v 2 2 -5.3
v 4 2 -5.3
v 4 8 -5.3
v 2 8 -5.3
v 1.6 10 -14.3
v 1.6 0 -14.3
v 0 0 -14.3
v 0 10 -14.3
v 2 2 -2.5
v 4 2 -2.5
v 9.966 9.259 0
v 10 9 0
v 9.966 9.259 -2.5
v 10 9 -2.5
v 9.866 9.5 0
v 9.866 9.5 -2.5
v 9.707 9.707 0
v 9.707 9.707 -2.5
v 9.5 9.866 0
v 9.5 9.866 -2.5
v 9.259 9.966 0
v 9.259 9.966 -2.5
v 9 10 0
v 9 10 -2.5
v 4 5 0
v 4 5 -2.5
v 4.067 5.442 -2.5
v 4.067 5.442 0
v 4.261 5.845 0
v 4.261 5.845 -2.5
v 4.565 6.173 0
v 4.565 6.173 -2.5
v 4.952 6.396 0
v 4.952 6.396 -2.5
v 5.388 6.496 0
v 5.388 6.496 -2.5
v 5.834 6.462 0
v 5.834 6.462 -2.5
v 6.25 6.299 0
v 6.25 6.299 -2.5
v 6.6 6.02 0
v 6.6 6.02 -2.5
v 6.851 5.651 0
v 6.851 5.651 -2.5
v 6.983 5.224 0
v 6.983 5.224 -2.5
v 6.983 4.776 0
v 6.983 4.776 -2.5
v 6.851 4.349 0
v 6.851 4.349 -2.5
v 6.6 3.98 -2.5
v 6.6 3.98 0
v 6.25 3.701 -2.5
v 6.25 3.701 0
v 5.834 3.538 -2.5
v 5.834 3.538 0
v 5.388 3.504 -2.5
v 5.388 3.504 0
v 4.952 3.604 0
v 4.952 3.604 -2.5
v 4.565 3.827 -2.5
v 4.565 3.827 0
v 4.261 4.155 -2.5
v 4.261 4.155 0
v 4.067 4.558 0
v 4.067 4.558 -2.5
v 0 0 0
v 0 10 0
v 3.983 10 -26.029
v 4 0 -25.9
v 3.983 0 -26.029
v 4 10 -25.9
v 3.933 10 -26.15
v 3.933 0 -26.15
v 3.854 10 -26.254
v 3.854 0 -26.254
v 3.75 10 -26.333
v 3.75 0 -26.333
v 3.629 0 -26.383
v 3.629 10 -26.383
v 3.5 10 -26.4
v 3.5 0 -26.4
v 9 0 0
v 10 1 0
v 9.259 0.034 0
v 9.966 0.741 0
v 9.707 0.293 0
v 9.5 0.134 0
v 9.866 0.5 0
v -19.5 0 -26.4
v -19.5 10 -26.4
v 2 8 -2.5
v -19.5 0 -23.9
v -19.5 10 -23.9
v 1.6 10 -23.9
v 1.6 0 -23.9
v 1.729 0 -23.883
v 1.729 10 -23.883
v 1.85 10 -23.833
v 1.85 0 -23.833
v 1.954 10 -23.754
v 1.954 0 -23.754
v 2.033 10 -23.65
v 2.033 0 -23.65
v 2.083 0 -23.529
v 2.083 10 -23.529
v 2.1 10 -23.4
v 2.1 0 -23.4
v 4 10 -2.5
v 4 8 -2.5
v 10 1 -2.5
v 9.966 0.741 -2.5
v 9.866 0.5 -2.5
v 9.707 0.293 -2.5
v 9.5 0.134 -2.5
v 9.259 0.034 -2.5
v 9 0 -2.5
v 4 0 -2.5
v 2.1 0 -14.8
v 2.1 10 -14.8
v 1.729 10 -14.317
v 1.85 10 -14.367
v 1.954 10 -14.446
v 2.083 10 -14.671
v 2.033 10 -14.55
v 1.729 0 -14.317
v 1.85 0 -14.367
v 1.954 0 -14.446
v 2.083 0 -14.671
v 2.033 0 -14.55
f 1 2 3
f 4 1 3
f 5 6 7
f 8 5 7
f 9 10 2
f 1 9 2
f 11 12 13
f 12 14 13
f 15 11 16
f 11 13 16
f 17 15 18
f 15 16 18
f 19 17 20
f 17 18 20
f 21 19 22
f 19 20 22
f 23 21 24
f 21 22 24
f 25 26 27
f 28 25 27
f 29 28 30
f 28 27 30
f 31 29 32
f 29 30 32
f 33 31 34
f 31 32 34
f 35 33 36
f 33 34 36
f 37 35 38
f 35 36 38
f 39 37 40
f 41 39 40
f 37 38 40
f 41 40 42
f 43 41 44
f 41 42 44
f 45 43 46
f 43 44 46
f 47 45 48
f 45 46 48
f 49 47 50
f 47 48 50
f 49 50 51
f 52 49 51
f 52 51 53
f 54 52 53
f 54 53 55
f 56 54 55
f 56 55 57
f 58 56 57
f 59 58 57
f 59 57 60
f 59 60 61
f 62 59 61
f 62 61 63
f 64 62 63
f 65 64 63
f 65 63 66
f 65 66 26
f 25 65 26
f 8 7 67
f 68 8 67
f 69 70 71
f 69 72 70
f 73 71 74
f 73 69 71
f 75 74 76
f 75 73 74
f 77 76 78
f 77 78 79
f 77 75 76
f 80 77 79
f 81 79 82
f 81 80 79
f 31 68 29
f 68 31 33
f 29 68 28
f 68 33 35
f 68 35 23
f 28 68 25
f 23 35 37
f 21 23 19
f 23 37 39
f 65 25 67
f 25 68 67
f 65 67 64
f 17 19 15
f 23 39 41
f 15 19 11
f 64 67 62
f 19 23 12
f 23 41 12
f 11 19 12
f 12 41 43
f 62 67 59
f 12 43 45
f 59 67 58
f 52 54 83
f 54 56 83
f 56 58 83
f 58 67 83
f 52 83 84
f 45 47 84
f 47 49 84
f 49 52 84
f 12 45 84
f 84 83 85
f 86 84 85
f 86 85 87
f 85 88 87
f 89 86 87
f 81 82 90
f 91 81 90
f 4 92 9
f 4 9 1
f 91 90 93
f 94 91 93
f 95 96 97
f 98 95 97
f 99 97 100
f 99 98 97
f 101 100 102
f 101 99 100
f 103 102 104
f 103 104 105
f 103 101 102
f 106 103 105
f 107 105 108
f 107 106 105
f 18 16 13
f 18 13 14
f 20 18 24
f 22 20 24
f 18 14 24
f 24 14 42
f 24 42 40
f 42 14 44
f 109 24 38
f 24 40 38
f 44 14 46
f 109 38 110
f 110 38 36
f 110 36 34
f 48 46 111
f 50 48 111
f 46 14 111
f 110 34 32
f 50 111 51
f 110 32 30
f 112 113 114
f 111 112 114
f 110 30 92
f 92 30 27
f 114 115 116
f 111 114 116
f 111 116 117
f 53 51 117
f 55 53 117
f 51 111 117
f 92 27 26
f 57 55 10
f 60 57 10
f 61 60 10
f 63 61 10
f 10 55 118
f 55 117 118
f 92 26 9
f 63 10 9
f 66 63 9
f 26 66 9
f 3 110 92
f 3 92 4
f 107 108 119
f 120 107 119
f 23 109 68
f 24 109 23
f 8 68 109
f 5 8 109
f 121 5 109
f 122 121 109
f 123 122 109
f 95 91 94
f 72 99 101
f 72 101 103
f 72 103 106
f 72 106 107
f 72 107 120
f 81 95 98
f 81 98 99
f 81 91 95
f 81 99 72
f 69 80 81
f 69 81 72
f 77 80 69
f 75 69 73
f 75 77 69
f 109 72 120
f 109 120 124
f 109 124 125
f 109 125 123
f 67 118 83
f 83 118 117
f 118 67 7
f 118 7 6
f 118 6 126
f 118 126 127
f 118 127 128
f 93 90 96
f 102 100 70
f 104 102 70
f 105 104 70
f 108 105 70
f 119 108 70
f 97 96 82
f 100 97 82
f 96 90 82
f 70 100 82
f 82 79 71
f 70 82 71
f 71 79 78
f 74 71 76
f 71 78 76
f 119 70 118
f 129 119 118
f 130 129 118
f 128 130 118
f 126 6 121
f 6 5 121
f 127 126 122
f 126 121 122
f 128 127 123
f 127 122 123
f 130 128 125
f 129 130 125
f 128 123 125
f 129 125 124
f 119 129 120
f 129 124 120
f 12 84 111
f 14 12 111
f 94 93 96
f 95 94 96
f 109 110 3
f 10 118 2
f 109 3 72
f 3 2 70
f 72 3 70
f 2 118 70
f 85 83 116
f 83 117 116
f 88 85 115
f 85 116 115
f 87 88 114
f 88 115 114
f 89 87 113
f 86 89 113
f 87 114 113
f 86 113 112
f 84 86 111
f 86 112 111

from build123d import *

# Parameters (mm, degrees)
EXTRUDE_1_DEPTH     = 10
SKETCH_2_R          = 1.5
CUT_EXTRUDE_1_DEPTH = 10
FILLET_1_R          = 0.5
FILLET_2_R          = 0.5
FILLET_3_R          = 1
SKETCH_3_W          = 2.8
SKETCH_3_H          = 6
CUT_EXTRUDE_2_DEPTH = 2


with BuildPart() as part:
    # 草图1 → 凸台-拉伸1 (new body)
    with BuildSketch(Plane(origin=(0, 0, 0), x_dir=(1, 0, 0), z_dir=(0, 1, 0))):
        Polygon((0, 0), (10, 0), (10, 2.5), (4, 2.5), (4, 26.4), (-19.5, 26.4), (-19.5, 23.9), (2.1, 23.9), (2.1, 14.3), (0, 14.3), align=None)
    extrude(amount=EXTRUDE_1_DEPTH)

    # 草图2 → 切除-拉伸1 (cut)
    with BuildSketch(Plane(origin=(0, 0, -2.5), x_dir=(-1, 0, 0), z_dir=(0, 0, -1))):
        with Locations((-5.5, 5)):
            Circle(SKETCH_2_R)
    extrude(amount=-CUT_EXTRUDE_1_DEPTH, mode=Mode.SUBTRACT)

    # 圆角1
    fillet_1_edges = [part.edges().sort_by_distance(p)[0] for p in [
        (2.1, 5, -23.9),
        (4, 5, -26.4),
    ]]
    fillet(fillet_1_edges, radius=FILLET_1_R)

    # 圆角2
    fillet_2_edges = [part.edges().sort_by_distance(p)[0] for p in [
        (2.1, 5, -14.3),
    ]]
    fillet(fillet_2_edges, radius=FILLET_2_R)

    # 圆角3
    fillet_3_edges = [part.edges().sort_by_distance(p)[0] for p in [
        (10, 10, -1.25),
        (10, 0, -1.25),
    ]]
    fillet(fillet_3_edges, radius=FILLET_3_R)

    # 草图3 → 切除-拉伸2 (cut)
    with BuildSketch(Plane(origin=(4, 0, 0), x_dir=(0, 0, -1), z_dir=(1, 0, 0))):
        with Locations((3.9, 5)):
            Rectangle(SKETCH_3_W, SKETCH_3_H)
    extrude(amount=-CUT_EXTRUDE_2_DEPTH, mode=Mode.SUBTRACT)


solid = part.part
